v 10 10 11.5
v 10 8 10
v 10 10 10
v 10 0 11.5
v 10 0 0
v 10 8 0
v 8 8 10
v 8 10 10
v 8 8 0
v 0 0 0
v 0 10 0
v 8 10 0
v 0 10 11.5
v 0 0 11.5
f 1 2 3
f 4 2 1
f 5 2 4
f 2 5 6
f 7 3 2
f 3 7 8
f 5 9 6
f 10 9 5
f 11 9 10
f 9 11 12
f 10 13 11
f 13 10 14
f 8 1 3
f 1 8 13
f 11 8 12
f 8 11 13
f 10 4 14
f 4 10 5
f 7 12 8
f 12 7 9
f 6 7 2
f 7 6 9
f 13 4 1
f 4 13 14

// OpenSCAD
// file: ../lib/shared-constants.scad
// Included by the lib, to exercise recursive inlining.
NOTCH = 2;
LID_THICKNESS = 1.5;
// file: ../lib/fixture-cube-lib.scad
// Fixture model for model-forge tests. Deliberately trivial so renders are fast.

include <shared-constants.scad>;

// BEGIN_PARAMS

// Edge length of the box (mm).
size = 10;

// Height multiplier.
height_mult = 1;

// Which corner to notch.
corner = "ne";  // [ne, nw, se, sw]

// Cut the notch at all.
notched = true;

// END_PARAMS

module box() {
  difference() {
    cube([size, size, size * height_mult]);
    if (notched) translate([size - NOTCH, size - NOTCH, 0]) cube([NOTCH, NOTCH, size]);
  }
}

module lid() {
  cube([size, size, LID_THICKNESS]);
}
// main file
include <../lib/fixture-cube-lib.scad>;
$fn = 16;

color("red") box();
color("blue") translate([0, 0, size]) lid();
